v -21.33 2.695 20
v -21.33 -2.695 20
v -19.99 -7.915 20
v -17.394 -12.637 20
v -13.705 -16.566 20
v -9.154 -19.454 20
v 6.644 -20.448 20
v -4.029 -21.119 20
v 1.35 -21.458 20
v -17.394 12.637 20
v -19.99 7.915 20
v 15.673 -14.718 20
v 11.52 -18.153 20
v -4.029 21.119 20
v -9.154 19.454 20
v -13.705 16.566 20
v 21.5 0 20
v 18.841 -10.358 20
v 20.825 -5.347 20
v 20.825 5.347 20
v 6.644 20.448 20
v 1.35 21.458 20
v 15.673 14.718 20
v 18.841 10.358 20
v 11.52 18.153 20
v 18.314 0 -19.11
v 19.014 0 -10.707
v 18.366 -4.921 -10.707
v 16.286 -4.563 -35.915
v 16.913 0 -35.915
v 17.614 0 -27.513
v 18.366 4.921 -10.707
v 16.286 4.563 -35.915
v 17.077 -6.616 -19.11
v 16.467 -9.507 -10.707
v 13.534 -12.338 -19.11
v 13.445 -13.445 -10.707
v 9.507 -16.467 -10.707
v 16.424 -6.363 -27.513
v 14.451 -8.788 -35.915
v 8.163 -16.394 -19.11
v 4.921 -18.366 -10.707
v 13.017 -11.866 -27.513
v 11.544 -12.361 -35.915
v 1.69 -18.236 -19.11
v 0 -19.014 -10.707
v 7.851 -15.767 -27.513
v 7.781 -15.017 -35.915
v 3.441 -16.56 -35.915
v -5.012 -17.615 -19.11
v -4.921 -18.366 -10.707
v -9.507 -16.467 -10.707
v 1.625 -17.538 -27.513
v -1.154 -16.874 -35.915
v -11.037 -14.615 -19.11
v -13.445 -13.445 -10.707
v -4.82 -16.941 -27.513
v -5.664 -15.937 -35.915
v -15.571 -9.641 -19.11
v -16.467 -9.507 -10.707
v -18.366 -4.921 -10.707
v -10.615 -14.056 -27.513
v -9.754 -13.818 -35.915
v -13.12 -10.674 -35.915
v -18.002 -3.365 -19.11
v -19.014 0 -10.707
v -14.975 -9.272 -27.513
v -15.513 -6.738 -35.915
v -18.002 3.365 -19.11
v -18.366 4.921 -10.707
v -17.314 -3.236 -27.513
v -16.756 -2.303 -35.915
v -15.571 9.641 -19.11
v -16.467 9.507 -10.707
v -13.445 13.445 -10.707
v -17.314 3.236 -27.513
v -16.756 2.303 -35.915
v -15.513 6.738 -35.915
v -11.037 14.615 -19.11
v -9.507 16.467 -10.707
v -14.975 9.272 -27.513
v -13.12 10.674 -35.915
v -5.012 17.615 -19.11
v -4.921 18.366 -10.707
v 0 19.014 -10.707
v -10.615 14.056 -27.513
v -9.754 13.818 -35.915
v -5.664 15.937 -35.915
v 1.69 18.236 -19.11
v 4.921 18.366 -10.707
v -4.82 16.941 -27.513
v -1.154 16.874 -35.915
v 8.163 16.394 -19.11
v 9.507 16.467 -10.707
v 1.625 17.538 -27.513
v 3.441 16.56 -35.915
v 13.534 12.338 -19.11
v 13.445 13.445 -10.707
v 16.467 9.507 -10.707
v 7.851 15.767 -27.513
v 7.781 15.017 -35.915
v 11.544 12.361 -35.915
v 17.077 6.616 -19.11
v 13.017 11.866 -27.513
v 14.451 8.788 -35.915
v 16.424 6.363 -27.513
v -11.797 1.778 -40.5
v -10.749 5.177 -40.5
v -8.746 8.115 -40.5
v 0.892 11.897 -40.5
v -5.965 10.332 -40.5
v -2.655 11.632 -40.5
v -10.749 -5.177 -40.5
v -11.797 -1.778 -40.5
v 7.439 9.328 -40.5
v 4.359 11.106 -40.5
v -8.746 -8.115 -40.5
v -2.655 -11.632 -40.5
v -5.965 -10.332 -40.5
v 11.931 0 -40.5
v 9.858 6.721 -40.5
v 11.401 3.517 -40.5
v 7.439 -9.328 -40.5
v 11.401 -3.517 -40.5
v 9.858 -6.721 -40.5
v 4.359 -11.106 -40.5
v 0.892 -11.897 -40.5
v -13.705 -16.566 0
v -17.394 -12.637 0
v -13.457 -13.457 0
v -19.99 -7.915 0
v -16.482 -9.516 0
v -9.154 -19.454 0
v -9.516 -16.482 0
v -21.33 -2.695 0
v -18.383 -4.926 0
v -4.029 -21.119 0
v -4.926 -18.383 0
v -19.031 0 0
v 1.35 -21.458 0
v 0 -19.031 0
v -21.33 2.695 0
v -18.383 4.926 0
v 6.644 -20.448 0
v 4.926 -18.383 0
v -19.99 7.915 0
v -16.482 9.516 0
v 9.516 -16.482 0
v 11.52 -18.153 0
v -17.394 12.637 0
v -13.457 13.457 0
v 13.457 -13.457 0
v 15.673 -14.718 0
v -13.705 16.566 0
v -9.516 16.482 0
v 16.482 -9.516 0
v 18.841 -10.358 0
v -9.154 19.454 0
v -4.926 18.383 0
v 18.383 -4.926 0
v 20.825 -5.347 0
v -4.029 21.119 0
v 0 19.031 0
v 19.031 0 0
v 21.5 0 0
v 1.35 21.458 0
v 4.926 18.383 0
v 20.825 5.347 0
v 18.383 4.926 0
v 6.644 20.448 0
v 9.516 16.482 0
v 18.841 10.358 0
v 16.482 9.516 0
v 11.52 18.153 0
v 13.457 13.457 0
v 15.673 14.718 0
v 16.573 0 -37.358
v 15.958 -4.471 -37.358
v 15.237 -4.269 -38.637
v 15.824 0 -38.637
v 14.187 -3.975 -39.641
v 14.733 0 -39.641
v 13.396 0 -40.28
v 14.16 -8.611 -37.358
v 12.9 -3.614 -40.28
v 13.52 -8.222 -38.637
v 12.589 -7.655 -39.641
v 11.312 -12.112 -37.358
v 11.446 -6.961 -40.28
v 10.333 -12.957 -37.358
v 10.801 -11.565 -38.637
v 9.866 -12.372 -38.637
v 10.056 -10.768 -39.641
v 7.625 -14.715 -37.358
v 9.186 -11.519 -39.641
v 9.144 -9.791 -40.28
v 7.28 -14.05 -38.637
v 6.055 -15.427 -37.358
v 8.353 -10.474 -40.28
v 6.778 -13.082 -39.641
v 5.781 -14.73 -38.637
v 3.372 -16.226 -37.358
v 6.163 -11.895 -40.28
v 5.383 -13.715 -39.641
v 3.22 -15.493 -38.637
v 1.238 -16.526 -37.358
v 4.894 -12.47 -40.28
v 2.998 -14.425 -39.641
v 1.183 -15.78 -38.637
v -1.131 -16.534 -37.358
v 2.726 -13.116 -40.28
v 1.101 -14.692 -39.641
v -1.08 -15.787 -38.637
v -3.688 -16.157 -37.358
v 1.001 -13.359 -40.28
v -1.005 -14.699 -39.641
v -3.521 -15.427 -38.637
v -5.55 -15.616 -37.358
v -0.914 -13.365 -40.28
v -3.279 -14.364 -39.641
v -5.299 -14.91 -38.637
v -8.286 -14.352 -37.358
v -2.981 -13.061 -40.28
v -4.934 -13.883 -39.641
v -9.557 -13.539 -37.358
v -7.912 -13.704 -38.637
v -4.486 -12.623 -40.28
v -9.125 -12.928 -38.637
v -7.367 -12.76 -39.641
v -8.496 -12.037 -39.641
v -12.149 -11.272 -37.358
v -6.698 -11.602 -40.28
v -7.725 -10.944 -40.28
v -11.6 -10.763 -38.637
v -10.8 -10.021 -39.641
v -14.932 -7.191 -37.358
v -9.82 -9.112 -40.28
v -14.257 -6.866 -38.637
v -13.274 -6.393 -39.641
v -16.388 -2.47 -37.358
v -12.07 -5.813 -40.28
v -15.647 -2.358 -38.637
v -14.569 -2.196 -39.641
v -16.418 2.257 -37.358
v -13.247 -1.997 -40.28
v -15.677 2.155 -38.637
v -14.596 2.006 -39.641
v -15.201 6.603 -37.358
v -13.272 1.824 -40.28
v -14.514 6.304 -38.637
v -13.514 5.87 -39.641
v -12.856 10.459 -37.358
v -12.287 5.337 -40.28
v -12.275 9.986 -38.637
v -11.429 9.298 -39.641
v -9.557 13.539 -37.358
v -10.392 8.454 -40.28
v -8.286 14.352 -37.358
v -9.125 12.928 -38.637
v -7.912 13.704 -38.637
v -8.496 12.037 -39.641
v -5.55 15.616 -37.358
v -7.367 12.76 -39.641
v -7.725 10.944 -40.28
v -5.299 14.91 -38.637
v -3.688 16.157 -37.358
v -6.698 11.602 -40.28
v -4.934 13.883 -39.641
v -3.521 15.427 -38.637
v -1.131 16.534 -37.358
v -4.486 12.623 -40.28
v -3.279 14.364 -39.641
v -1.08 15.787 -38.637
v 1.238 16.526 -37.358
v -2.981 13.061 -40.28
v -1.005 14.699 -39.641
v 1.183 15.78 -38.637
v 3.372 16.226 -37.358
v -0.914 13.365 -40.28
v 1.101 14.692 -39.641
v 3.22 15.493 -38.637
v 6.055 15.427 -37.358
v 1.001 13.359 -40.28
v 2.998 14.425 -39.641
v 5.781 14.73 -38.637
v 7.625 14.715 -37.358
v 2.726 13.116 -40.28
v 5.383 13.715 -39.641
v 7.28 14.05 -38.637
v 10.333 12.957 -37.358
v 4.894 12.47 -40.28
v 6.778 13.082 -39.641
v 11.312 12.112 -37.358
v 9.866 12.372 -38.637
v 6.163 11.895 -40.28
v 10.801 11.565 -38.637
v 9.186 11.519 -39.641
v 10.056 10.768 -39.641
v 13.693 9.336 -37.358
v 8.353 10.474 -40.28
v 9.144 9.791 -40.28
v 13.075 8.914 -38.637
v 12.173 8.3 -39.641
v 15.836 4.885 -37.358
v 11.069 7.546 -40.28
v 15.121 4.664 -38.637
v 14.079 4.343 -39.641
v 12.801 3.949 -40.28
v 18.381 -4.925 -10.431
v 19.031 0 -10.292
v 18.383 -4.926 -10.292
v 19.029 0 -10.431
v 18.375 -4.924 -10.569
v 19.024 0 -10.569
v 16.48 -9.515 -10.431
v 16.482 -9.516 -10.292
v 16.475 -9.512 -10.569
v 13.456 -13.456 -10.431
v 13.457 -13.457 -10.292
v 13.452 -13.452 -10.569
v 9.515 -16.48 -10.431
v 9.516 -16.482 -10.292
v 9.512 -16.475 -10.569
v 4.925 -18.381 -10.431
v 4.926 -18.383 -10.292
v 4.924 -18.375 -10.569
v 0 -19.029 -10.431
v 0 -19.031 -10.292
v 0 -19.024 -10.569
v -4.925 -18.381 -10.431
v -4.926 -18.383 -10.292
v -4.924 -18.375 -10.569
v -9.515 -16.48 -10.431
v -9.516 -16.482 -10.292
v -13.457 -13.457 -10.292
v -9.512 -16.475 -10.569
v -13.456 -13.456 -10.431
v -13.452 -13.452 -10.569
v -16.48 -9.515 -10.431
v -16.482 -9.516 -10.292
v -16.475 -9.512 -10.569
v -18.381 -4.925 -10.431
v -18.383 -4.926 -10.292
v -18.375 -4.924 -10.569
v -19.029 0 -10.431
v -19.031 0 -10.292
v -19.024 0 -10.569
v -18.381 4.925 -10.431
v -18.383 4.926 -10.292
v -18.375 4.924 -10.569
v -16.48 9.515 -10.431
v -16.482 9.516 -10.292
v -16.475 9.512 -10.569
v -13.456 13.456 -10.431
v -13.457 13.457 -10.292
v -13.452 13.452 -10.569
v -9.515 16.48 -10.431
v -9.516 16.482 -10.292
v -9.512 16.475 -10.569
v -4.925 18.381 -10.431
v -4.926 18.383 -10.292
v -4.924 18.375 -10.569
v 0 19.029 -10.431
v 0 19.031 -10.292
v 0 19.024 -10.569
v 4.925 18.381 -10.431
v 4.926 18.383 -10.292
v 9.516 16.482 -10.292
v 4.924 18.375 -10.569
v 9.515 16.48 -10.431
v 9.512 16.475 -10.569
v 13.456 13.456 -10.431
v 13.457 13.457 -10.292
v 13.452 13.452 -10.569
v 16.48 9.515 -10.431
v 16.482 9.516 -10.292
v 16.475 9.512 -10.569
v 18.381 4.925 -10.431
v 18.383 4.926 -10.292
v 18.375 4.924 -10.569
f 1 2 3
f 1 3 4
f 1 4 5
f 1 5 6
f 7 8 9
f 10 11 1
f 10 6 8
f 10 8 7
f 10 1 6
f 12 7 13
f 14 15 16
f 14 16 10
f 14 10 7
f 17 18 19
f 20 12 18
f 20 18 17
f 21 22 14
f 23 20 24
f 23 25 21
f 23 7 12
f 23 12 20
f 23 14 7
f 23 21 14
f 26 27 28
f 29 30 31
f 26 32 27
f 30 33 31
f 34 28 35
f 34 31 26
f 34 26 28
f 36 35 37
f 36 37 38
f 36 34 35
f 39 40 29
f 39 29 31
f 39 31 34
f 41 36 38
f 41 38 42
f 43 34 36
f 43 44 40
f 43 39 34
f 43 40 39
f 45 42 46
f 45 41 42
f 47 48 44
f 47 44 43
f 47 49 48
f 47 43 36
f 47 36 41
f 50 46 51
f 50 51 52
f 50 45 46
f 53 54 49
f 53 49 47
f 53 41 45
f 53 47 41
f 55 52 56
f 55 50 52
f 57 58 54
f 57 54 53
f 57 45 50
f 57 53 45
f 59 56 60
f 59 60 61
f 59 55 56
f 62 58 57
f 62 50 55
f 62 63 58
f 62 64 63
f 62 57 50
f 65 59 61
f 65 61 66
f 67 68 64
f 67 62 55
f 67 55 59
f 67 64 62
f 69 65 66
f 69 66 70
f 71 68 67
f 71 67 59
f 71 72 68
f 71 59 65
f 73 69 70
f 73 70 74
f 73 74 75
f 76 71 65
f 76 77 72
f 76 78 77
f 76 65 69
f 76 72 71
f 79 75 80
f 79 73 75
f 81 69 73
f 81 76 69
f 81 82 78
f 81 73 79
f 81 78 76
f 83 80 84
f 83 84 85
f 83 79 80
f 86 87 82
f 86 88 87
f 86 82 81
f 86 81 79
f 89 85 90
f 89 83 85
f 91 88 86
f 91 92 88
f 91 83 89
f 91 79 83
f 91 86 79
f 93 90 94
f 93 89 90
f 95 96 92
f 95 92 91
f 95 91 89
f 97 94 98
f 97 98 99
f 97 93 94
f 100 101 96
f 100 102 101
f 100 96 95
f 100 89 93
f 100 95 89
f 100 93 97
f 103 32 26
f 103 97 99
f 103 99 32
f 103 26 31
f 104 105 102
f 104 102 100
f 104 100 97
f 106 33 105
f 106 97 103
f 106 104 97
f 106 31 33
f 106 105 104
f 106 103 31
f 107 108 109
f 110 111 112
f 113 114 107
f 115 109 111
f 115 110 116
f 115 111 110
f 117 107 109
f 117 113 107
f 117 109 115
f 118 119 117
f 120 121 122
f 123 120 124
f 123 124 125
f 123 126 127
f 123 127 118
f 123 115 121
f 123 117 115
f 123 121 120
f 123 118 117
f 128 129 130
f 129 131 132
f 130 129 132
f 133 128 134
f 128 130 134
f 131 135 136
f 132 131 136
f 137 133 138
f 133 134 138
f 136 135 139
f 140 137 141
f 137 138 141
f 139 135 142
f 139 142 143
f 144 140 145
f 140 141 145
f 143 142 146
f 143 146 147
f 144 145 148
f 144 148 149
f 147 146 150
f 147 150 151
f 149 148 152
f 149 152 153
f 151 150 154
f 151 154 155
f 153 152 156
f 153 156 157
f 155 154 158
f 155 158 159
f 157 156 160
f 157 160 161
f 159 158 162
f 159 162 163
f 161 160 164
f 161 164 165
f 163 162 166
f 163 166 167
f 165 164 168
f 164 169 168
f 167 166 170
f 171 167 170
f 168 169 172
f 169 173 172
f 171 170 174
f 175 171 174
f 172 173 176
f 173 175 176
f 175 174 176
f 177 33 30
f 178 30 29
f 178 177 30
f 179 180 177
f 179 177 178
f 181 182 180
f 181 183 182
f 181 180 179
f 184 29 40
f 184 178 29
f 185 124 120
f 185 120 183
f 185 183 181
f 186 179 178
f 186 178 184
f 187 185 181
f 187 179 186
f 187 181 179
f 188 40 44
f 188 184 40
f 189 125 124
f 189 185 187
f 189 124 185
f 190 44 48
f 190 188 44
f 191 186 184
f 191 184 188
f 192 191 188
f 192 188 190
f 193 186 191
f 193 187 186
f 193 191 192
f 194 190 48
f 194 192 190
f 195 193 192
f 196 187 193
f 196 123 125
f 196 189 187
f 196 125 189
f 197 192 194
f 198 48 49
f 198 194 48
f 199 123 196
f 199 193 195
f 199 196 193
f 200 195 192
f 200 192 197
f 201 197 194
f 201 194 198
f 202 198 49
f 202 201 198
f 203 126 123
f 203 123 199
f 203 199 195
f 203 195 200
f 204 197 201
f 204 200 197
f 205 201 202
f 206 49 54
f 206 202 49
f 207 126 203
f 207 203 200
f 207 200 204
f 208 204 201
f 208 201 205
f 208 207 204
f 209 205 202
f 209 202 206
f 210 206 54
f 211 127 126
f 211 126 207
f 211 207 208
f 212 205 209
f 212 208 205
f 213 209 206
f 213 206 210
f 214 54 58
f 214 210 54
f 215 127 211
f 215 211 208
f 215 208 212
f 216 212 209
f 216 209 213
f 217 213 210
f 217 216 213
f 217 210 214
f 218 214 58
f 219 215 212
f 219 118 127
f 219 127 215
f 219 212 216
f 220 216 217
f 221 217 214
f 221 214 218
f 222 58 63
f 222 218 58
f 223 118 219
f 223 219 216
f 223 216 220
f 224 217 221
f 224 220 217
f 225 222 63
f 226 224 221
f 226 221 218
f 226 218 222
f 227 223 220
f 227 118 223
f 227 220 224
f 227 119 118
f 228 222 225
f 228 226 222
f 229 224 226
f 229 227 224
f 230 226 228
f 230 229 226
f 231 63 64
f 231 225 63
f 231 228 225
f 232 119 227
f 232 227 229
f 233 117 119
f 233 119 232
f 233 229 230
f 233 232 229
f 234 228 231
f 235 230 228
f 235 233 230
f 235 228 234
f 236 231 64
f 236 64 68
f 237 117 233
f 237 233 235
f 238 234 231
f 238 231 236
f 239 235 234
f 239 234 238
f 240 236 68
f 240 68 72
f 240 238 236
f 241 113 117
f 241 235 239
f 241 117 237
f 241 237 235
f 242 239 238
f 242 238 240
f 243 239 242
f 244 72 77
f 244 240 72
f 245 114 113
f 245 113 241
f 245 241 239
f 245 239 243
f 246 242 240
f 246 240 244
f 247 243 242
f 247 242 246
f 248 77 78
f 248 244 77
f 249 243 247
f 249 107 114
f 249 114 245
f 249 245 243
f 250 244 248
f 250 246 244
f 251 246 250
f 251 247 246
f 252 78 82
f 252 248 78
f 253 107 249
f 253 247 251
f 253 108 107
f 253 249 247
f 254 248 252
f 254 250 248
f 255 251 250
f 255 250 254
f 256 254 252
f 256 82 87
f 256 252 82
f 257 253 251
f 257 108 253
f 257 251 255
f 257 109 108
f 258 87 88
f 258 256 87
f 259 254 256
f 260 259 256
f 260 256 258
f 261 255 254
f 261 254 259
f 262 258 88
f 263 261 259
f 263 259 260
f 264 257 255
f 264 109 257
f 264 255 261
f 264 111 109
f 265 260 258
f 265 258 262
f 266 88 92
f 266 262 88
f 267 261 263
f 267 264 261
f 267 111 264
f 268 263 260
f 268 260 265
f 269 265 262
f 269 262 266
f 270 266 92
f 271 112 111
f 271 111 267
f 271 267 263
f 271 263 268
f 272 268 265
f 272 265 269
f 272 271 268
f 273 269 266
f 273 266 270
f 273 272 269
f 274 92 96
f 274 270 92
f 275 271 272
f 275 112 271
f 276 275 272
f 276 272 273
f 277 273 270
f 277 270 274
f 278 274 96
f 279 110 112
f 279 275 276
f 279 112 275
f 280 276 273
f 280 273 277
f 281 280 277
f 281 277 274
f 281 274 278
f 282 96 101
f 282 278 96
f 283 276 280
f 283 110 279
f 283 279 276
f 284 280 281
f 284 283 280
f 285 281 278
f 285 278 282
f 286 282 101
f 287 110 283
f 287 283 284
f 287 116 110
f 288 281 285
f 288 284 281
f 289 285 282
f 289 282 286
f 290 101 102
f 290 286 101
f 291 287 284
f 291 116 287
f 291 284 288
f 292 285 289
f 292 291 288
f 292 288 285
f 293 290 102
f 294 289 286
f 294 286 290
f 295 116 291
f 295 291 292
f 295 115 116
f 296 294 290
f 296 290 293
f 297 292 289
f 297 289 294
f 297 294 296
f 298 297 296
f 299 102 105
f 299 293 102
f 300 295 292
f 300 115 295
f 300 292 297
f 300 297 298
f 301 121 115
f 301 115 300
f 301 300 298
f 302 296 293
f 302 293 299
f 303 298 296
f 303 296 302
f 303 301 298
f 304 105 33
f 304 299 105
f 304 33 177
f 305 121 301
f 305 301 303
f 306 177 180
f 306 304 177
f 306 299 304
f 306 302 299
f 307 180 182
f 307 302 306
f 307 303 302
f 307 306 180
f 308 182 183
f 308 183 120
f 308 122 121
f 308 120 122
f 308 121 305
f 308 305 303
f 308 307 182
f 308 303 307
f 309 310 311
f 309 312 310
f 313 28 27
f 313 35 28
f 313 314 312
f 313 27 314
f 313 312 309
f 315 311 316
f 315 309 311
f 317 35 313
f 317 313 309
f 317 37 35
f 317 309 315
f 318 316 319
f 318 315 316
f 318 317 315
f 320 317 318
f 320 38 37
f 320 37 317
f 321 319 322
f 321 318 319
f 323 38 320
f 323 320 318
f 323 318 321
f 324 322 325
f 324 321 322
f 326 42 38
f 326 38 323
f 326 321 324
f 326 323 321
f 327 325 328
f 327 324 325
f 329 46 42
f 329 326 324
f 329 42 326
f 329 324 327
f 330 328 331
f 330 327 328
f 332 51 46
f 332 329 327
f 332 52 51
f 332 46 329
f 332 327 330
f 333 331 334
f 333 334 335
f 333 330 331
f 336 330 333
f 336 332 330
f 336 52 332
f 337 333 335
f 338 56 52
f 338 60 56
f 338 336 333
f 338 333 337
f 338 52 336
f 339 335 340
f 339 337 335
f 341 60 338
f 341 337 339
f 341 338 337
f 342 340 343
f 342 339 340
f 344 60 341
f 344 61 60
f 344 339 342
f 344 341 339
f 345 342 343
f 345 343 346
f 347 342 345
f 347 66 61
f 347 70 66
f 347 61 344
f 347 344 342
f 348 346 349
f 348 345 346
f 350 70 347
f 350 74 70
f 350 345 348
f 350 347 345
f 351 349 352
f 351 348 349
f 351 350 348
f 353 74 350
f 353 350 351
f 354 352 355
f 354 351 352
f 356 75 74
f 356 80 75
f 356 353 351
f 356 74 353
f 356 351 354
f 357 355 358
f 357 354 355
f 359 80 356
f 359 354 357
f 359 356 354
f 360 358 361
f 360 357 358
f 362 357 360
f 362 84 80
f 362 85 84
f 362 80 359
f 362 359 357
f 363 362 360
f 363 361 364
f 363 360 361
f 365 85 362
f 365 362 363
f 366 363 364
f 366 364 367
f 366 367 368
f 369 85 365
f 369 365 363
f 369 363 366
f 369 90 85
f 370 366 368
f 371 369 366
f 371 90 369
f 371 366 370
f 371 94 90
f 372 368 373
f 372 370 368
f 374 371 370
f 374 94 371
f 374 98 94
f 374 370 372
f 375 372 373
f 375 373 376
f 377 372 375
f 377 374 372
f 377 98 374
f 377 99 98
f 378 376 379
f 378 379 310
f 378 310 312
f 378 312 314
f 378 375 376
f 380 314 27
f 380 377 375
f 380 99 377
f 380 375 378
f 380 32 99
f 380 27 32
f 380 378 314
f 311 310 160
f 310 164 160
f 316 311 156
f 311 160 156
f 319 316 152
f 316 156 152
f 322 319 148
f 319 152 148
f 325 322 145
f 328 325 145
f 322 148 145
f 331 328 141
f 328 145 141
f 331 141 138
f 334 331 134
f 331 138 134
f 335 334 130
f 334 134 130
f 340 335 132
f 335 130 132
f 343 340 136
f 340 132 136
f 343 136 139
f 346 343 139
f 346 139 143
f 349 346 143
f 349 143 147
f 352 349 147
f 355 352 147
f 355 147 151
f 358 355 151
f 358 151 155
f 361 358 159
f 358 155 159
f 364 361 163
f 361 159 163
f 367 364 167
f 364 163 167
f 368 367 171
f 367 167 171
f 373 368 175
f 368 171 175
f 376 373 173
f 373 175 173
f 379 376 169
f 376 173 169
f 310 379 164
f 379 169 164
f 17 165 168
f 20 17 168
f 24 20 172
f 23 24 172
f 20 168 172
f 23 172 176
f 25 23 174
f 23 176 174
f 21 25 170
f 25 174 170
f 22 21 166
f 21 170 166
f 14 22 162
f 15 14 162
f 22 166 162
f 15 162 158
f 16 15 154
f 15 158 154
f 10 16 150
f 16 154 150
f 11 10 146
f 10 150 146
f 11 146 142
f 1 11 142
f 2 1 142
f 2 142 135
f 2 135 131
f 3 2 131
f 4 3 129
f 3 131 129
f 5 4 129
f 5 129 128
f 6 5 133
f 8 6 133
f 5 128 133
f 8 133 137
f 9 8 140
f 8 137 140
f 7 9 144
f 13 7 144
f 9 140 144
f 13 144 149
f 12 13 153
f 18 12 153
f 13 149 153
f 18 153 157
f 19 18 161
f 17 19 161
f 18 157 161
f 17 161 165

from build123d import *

# Parameters (mm, degrees)
F0_R     = 21.5
F1_DEPTH = 20
F2_R     = 19.0313090647
F3_DEPTH = 0.5
F4_R     = 19.0313090647
F5_DEPTH = 40


# Not quite as in the source:
# - a fillet or chamfer that OpenCascade refuses, or shapes differently, is made with other operations: its cross-section is extruded or revolved along the edge and cut away or added


with BuildPart() as f1:
    # F0 (on Top) → F1 (new body)
    with BuildSketch(Plane.XY):
        Circle(F0_R)
    extrude(amount=F1_DEPTH)

    # F2 (on face) → F3 (join)
    with BuildSketch(Plane(origin=(0, 0, 0), x_dir=(1, 0, 0), z_dir=(0, 0, -1))):
        Circle(F2_R)
    extrude(amount=F3_DEPTH)

    # F4 (on face) → F5 (join)
    with BuildSketch(Plane(origin=(0, 0, -0.5), x_dir=(1, 0, 0), z_dir=(0, 0, -1))):
        Circle(F4_R)
    extrude(amount=F5_DEPTH)

    # F6: chamfer of 2.5 x 30 on 1 edges, made by hand

    # F6_s1 → F6_t2 (revolve, cut)
    with BuildSketch(Plane.XZ):
        Polygon((19.0313090647, -10.5), (16.5313090647, -40.5), (19.0313090647, -40.5), align=None)
    revolve(axis=Axis((0, 0, -40.5), (0, 0, -1)), mode=Mode.SUBTRACT)

    # F7: fillet of radius 5 on 2 edges, made by hand

    # F7_s1 → F7_t2 (revolve, cut)
    with BuildSketch(Plane.XZ):
        with BuildLine():
            ThreePointArc((16.9133734481, -35.9152273993), (15.3161921018, -39.1794114337), (11.9306446569, -40.5))
            Line((11.9306446569, -40.5), (16.5313090647, -40.5))
            Line((16.5313090647, -40.5), (16.9133734481, -35.9152273993))
        make_face()
    revolve(axis=Axis((0, 0, -40.5), (0, 0, -1)), mode=Mode.SUBTRACT)

    # F7_s3 → F7_t4 (revolve, cut)
    with BuildSketch(Plane.XZ):
        with BuildLine():
            ThreePointArc((19.0313090647, -10.2920271064), (19.0269893965, -10.4998203255), (19.0140378559, -10.7072545056))
            Line((19.0140378559, -10.7072545056), (19.0313090647, -10.5))
            Line((19.0313090647, -10.5), (19.0313090647, -10.2920271064))
        make_face()
    revolve(axis=Axis((0, 0, -10.5), (0, 0, -1)), mode=Mode.SUBTRACT)


solid = f1.part
